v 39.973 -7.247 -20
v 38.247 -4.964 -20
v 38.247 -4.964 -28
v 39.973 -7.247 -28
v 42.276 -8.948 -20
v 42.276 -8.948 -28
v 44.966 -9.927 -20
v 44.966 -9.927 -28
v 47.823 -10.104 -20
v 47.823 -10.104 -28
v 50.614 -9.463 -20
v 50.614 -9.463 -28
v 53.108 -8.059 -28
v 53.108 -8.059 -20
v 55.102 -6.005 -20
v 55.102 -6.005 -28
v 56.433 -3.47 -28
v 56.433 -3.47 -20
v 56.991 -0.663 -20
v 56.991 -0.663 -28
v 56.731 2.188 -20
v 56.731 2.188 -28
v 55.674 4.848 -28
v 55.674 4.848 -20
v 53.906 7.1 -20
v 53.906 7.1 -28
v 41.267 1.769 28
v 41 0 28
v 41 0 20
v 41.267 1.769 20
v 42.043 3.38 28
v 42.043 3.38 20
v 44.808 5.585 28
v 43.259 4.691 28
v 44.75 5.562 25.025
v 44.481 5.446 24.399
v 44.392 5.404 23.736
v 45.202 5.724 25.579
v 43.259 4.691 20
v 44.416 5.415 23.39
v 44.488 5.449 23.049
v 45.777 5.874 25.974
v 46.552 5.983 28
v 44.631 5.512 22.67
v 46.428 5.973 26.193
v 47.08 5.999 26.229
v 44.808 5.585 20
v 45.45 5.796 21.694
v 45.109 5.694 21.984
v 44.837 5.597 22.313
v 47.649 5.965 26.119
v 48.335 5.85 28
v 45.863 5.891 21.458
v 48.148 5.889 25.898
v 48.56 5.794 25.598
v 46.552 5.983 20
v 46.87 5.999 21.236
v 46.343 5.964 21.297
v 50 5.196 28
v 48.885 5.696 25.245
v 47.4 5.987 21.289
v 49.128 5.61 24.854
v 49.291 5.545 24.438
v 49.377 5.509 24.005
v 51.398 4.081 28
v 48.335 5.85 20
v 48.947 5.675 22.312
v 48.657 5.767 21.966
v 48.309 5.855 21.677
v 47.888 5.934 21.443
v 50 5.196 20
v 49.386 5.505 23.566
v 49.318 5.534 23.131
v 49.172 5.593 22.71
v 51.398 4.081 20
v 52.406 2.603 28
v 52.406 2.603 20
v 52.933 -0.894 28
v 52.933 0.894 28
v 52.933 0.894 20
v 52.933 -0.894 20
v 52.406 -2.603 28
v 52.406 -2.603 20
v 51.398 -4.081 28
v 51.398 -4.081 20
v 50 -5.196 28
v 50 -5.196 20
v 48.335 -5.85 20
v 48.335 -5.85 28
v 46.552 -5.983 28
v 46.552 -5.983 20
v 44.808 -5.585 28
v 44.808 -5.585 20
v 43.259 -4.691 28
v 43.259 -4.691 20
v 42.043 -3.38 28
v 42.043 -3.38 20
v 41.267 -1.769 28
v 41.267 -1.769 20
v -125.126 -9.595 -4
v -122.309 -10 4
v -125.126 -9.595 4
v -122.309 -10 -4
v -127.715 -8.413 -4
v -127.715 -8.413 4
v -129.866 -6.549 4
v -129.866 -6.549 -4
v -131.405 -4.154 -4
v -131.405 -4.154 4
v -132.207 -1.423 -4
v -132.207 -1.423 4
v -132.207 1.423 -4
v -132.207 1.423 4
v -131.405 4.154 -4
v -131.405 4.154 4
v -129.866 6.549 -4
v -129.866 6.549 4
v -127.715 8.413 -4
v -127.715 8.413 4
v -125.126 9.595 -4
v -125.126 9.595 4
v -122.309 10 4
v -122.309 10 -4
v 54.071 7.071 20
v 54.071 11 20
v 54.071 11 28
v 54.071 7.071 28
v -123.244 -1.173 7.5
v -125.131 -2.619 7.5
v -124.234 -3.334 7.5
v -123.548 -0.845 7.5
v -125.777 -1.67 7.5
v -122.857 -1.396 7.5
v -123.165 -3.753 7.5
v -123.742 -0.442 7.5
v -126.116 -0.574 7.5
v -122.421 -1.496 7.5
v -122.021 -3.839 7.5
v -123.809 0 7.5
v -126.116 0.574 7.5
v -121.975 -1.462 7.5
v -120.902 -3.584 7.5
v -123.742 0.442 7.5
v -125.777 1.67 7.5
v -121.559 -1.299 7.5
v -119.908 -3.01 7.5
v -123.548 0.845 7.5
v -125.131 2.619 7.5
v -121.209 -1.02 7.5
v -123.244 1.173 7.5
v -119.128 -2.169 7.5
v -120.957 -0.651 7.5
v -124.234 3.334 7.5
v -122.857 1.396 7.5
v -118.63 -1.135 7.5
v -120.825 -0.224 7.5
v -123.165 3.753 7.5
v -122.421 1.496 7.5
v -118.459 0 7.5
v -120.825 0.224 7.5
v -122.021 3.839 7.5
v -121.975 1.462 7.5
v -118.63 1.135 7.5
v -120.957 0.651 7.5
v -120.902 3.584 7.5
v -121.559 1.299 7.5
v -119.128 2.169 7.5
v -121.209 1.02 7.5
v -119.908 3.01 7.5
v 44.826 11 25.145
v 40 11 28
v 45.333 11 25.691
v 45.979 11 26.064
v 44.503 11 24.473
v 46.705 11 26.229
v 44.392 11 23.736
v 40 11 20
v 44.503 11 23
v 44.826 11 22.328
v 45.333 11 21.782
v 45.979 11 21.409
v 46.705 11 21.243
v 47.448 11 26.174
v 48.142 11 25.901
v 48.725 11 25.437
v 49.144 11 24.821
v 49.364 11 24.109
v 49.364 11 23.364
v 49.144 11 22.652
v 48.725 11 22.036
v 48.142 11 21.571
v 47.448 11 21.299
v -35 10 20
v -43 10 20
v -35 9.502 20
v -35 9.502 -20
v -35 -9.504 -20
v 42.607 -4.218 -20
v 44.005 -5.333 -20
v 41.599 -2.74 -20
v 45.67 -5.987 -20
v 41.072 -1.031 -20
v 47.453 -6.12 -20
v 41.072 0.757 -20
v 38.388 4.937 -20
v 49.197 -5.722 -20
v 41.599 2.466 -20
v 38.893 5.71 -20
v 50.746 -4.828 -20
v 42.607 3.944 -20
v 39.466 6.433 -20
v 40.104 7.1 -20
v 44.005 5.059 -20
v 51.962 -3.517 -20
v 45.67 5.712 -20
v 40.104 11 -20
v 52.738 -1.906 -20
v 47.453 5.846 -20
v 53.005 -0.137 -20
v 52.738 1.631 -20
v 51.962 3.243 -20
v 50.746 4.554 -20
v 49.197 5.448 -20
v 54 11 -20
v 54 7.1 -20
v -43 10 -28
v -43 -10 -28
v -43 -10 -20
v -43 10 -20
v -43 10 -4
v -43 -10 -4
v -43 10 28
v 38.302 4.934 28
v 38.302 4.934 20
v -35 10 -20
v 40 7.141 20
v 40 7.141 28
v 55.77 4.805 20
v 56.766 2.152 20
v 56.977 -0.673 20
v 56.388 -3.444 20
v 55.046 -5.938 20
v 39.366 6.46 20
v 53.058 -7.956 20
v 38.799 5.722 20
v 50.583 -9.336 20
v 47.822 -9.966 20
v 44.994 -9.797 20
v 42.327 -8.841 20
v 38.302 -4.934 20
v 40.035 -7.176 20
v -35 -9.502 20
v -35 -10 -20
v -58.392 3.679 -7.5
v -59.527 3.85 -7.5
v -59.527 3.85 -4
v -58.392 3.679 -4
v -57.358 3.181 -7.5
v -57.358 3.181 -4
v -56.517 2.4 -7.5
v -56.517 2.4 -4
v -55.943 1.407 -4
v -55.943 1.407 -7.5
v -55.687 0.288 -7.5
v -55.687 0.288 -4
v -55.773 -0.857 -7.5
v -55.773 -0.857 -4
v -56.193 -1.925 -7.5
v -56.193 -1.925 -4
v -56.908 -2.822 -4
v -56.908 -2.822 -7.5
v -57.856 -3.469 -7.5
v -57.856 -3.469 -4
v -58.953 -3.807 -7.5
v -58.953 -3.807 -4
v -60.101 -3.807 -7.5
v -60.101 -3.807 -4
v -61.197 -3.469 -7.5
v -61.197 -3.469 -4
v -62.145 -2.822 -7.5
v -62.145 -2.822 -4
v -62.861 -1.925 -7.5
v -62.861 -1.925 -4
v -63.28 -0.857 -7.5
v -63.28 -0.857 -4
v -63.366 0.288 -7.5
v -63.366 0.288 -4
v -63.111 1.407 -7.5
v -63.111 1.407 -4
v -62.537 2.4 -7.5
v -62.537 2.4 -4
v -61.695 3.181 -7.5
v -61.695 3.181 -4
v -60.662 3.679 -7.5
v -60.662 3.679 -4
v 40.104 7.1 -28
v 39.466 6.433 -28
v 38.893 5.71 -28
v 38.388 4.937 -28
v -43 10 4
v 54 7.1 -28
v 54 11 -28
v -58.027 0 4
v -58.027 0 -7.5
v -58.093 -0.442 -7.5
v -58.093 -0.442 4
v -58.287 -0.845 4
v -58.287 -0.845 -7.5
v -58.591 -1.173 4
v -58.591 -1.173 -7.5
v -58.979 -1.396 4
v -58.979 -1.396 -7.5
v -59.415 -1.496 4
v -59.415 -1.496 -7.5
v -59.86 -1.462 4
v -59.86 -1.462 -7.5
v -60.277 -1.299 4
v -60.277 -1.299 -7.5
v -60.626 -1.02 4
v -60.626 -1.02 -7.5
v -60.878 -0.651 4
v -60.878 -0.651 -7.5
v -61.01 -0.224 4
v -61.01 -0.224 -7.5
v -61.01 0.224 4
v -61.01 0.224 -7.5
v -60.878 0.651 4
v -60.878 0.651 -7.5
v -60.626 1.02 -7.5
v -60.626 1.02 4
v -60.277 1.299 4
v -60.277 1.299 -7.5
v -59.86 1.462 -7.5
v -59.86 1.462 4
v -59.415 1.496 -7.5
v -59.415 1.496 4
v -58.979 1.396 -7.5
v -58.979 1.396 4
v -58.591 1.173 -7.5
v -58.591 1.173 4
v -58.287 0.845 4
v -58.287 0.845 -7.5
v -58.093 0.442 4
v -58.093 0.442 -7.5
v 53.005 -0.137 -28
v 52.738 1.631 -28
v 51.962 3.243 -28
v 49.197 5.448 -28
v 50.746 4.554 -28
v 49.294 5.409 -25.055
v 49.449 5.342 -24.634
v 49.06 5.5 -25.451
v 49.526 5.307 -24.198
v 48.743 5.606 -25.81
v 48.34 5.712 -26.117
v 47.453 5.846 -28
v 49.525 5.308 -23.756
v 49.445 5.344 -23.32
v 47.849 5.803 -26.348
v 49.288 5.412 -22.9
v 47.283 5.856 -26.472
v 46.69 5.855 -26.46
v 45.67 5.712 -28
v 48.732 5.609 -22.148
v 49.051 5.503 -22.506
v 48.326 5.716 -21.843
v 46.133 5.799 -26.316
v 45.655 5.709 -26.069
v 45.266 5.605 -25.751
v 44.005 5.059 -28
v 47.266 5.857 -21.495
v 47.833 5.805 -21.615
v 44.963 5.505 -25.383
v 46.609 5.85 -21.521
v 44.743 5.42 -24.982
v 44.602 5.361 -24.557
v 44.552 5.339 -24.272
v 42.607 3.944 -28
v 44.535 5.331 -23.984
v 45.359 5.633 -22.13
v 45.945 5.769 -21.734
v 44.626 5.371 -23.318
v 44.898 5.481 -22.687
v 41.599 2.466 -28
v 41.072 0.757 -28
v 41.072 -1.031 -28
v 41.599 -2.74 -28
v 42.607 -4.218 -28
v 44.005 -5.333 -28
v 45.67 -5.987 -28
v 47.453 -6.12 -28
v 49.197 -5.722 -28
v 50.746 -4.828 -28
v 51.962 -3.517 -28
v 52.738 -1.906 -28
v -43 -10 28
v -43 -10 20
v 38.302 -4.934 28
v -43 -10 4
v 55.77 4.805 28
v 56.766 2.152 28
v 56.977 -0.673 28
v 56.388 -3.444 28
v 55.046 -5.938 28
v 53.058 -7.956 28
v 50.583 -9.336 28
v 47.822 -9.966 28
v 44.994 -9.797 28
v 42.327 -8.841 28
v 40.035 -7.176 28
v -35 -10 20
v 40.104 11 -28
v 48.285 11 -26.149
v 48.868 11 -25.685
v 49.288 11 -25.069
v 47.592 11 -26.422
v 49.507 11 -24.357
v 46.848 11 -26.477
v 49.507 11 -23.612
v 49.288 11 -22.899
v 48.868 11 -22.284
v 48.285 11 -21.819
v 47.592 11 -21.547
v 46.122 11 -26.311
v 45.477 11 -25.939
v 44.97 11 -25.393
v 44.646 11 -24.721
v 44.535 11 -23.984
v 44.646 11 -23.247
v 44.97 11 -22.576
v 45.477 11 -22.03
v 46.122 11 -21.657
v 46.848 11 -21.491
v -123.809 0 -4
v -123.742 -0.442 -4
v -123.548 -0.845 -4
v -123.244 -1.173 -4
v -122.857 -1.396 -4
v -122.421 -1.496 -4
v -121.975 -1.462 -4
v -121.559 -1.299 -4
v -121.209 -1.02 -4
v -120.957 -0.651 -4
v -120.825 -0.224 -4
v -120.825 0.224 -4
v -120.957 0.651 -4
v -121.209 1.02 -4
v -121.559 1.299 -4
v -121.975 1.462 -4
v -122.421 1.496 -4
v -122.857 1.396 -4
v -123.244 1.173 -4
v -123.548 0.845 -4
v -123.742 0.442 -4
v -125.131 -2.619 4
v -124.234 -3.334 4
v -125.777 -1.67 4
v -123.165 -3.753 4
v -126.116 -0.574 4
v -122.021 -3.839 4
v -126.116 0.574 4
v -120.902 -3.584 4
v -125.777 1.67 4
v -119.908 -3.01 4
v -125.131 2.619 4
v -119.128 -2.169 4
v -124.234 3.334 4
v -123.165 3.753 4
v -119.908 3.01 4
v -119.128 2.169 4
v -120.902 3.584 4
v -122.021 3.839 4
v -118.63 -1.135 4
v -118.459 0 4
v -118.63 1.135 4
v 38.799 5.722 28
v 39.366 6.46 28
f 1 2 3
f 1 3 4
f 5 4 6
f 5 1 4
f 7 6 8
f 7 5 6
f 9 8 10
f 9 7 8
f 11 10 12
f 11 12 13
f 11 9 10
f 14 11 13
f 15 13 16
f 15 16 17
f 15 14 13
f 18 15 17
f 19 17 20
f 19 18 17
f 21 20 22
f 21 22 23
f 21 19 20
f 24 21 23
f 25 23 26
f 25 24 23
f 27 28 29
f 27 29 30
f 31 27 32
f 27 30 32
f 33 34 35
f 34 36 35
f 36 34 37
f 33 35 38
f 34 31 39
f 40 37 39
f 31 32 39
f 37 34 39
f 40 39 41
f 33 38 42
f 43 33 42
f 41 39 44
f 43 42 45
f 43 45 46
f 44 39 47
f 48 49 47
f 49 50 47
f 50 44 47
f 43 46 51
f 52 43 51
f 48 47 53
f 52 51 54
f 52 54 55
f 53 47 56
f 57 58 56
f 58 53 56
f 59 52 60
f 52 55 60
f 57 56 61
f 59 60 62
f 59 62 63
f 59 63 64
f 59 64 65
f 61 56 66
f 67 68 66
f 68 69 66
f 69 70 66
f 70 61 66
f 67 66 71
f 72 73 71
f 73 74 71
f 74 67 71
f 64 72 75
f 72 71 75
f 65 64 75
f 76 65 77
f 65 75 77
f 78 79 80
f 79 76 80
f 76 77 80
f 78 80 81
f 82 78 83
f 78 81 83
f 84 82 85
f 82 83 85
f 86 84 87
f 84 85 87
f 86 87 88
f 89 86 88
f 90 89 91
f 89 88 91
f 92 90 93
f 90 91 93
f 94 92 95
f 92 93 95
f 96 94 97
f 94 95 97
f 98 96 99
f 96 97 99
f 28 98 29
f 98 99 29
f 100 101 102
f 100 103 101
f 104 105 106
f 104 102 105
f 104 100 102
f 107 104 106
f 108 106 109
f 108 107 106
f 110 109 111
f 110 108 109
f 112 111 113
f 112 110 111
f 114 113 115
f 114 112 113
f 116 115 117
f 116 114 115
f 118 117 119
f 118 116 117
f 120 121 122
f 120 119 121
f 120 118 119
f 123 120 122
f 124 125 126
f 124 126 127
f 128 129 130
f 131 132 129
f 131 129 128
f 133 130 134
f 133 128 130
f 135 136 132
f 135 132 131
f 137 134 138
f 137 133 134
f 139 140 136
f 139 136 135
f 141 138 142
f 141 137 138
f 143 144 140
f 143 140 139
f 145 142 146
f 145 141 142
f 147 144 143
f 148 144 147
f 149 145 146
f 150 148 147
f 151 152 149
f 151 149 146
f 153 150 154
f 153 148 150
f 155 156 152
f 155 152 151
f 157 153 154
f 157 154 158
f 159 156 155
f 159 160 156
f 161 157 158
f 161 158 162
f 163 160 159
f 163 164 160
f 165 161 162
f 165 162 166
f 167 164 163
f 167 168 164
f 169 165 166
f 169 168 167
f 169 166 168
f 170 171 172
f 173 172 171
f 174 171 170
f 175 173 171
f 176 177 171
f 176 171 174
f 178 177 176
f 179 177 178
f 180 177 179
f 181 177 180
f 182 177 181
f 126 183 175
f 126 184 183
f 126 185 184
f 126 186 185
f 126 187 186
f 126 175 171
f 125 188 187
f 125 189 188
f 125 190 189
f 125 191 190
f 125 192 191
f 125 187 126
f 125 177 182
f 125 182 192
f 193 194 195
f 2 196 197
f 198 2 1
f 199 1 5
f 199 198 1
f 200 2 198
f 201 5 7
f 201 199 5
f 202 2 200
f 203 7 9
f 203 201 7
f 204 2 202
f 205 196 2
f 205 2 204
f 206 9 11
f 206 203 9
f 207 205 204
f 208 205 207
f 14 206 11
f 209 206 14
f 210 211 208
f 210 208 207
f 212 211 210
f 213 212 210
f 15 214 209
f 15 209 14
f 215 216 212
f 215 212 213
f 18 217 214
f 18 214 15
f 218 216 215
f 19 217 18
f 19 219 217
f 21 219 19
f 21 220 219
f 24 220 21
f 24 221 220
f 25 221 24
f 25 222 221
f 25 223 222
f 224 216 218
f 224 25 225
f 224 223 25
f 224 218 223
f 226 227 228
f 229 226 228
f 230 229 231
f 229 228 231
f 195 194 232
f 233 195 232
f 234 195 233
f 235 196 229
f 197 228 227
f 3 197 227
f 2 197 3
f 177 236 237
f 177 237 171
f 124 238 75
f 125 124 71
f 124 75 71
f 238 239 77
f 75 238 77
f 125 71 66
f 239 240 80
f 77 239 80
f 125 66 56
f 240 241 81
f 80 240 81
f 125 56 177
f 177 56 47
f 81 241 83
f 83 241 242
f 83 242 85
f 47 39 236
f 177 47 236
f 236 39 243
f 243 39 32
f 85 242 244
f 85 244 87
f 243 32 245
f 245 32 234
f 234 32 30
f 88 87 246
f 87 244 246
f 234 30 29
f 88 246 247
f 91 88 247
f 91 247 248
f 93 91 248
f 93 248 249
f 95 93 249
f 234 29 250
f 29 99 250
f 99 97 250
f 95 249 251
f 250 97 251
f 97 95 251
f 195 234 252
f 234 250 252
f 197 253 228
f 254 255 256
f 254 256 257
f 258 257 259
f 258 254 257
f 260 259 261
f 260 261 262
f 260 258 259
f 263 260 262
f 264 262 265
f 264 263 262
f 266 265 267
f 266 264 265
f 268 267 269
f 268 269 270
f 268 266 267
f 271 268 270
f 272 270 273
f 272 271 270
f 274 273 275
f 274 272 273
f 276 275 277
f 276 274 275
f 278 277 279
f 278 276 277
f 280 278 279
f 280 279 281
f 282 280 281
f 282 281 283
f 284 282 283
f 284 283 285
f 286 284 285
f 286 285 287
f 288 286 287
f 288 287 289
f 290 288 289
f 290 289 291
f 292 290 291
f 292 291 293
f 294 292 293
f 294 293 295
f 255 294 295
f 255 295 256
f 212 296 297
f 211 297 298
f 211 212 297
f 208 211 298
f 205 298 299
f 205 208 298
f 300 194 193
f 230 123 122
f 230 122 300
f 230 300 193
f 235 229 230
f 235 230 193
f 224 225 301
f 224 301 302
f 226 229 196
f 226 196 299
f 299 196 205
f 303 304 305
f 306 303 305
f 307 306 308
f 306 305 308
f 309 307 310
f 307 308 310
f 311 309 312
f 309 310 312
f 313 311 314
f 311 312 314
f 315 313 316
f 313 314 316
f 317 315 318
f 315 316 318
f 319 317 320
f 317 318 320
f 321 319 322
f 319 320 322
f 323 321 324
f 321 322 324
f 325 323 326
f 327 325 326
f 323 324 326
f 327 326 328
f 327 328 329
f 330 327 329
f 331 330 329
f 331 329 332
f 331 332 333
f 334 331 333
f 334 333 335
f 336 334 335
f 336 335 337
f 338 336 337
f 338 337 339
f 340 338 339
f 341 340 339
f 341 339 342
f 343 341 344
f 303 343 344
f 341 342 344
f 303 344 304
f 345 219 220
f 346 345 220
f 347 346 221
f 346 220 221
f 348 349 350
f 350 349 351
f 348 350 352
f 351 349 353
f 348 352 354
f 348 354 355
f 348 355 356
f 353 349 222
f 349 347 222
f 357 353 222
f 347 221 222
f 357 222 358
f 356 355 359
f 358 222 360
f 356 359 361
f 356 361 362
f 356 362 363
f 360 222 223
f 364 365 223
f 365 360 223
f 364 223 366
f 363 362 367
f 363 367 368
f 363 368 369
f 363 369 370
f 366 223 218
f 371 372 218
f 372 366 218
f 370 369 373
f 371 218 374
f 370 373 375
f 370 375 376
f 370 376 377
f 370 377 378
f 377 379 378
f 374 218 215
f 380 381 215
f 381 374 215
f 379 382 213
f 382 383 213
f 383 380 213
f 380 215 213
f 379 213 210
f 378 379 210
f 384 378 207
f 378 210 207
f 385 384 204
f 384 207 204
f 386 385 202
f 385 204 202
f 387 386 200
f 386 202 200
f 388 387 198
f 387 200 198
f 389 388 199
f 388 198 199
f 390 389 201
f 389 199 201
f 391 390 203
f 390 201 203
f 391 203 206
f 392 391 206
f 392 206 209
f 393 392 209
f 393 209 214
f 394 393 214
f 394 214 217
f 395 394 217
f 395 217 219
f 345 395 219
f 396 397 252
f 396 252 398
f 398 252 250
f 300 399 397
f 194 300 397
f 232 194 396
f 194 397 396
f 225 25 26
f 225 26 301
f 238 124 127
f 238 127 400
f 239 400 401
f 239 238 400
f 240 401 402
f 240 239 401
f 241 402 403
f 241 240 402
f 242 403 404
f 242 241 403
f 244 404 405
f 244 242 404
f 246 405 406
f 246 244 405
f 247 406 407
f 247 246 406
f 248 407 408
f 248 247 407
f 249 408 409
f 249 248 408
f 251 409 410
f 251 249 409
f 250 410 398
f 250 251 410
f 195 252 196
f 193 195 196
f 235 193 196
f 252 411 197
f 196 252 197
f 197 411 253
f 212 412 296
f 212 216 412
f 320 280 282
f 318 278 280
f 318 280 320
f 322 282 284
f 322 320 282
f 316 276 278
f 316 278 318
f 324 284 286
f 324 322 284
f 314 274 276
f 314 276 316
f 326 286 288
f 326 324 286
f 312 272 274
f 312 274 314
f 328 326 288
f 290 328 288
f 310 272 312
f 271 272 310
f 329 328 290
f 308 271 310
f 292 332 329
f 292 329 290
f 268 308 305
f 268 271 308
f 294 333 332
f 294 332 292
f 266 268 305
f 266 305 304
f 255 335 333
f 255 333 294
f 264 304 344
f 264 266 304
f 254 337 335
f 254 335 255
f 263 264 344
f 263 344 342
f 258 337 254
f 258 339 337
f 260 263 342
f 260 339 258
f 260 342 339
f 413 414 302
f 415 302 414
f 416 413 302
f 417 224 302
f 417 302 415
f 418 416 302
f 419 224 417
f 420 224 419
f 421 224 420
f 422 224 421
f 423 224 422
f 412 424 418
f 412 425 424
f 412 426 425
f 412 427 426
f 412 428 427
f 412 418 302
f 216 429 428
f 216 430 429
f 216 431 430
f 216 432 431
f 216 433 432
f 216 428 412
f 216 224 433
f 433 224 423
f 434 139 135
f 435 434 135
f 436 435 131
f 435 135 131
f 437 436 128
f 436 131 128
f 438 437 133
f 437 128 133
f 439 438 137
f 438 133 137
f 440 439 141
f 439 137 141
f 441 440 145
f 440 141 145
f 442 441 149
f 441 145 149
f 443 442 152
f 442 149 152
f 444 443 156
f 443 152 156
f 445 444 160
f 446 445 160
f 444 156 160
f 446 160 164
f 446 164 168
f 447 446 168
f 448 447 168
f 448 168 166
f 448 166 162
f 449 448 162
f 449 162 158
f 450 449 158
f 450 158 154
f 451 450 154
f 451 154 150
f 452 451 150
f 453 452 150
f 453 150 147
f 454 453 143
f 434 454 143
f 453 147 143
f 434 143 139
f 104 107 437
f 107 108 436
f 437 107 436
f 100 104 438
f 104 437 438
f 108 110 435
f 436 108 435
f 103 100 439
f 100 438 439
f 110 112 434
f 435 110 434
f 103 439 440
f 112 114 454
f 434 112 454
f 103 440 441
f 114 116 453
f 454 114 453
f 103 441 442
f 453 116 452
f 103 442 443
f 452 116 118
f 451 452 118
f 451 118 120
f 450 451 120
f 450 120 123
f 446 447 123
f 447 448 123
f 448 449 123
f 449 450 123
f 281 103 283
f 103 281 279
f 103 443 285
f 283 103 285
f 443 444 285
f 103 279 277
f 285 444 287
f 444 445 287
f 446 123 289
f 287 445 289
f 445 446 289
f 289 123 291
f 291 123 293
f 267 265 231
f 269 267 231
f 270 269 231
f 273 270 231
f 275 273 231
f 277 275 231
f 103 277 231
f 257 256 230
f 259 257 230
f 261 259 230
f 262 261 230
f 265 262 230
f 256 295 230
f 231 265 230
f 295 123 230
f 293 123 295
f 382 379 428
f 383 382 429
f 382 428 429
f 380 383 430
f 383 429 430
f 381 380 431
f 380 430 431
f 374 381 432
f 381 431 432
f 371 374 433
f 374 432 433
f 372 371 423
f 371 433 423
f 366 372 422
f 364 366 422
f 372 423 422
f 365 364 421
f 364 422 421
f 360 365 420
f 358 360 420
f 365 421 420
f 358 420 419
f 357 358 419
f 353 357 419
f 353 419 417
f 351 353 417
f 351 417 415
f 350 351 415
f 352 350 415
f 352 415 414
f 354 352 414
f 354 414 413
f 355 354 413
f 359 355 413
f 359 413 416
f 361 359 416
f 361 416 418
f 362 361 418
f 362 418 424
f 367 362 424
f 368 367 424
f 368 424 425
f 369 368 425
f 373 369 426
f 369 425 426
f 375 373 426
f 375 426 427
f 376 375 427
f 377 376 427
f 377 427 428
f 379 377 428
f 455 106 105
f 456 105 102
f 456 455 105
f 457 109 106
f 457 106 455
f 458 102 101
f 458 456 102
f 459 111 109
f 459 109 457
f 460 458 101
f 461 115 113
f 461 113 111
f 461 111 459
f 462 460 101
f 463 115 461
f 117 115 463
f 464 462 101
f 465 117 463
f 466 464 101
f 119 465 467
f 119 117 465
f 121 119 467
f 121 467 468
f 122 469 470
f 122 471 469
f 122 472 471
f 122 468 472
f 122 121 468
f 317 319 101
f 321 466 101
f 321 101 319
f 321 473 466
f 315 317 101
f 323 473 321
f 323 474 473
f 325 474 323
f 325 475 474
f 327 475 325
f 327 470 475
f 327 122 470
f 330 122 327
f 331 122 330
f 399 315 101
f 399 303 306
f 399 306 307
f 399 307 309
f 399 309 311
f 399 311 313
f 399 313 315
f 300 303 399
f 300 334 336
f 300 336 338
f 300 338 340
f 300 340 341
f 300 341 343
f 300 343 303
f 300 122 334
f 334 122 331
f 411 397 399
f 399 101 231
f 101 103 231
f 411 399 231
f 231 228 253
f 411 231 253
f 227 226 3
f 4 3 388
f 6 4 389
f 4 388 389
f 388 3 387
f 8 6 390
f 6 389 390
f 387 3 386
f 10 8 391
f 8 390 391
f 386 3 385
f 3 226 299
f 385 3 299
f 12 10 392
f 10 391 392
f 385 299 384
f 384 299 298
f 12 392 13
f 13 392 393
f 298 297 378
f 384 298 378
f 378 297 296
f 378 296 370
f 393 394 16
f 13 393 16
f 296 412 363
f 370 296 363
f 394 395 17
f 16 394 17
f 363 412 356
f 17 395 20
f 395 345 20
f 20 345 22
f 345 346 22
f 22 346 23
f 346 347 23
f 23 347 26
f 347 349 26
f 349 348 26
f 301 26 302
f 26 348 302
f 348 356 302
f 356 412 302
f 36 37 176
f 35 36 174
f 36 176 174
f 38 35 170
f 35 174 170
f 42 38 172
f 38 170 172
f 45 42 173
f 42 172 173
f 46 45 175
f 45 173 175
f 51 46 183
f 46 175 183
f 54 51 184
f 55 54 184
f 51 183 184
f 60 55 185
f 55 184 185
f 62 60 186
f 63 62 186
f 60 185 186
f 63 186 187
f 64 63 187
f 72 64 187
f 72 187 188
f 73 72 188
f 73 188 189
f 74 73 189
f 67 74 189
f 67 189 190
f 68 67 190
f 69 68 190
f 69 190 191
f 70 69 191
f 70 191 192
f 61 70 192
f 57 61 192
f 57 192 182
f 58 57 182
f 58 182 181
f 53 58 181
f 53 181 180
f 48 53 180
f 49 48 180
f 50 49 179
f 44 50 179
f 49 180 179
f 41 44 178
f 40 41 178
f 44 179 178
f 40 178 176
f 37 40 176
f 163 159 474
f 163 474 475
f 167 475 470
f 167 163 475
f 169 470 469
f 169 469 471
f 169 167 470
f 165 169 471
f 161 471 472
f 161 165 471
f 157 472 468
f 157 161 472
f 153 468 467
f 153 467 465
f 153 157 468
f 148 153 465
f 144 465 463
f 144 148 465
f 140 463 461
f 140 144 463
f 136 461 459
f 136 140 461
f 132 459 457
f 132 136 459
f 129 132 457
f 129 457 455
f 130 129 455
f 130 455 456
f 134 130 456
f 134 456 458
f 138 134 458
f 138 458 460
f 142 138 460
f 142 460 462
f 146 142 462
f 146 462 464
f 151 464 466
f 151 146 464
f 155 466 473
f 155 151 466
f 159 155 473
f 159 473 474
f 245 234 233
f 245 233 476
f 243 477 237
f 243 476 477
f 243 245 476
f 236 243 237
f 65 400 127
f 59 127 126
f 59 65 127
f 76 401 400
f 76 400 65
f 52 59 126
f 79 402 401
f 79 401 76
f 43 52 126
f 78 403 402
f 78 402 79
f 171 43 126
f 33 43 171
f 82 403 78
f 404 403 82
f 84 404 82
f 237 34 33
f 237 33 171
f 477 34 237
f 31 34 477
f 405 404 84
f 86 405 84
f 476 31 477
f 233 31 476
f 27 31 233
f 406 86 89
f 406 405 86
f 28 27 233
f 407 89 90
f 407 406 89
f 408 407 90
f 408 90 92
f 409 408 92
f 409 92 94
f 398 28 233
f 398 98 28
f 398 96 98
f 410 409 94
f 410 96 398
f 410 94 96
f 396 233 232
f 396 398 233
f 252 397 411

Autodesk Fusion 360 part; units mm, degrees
sketch "Sketch1" plane through (0, 0, 0) normal (0, 0, 1) x (1, 0, 0)
  circle A0 centre (-60, 0) radius 3.75 construction
  circle A1 centre (-60, 0) radius 10 construction
  line L0 (-120, 10) -> (-40.6913, 10)
  line L1 (-120, -10) -> (-40.6913, -10)
  line L2 (-40.6913, 10) -> (-40.6913, -10)
  arc A2 (-120, 10) -> (-120, -10) centre (-120, 0) ccw
  dimension "d1" = 20
  dimension "d2" = 7.5
  dimension "d3" = 60
  dimension "d4" = 20
extrude "Extrude1" add sketch "Sketch1" along normal blind 8 makes body 1
sketch "Sketch2" plane through (0, 0, 0) normal (0, 1, 0) x (1, 0, 0)
  line L0 (-43, -20) -> (-35, -20)
  line L1 (-35, -20) -> (-35, 20)
  line L2 (-35, 20) -> (-43, 20)
  line L3 (-43, 20) -> (-43, -20)
  dimension "d7" = 8
  dimension "d8" = 40
extrude "Extrude2" add sketch "Sketch2" along normal blind 10 and the other way blind 10 separate body makes body 2
copy_body "Body->Comp1" bodies 1 removing the originals makes body 3 in component "section 1 (l4)"
copy_body "Body->Comp2" bodies 2 removing the originals makes body 4 in component "middle bit"
sketch "Sketch3" plane through (0, 0, 8) normal (0, 0, 1) x (-1, 0, 0)
  line L0 (40.6913, -10) -> (120, -10)
  arc A0 (120, -10) -> (120, 10) centre (120, 0) ccw
  line L1 (120, 10) -> (40.6913, 10)
  line L2 (40.6913, 10) -> (40.6913, -10)
  line L3 (25, -10) -> (25, 10)
  line L4 (25, -10) -> (-56.3022, -4.9345)
  line L5 (25, 10) -> (-56.3022, 4.9345)
  line L6 (-58, -11) -> (-72.0708, -11)
  line L7 (-72.0708, -11) -> (-72.0708, -7.0714)
  line L8 (-58, -7.0714) -> (-58, -11)
  arc A1 (-58, -7.1414) -> (-56.3022, -4.9345) centre (-65, 0) ccw
  arc A2 (-56.3022, 4.9345) -> (-72.0708, -7.0714) centre (-65, 0) ccw
  circle A3 centre (-65, 0) radius 6
  dimension "d17" = 20
  dimension "d18" = 90
  dimension "d19" = 12
extrude "Extrude3" add sketch "Sketch3" along normal blind 8 separate body contours L3 L4 L5 L6 L7 L8 A1 A2 makes body 5
sketch "Sketch5" plane through (0, 0, 0) normal (0, 0, 1) x (1, 0, 0)
  circle A0 centre (65.005, -0.1371) radius 6
  line L0 (-25, -10) -> (-25, 10)
  line L1 (-25, 10) -> (56.3881, 4.9373)
  line L2 (-25, -10) -> (56.247, -4.9638)
  line L3 (71.9058, 7.1002) -> (72, 7.1002)
  line L4 (72, 7.1002) -> (72, 11)
  line L5 (72, 11) -> (58.1042, 11)
  line L6 (58.1042, 11) -> (58.1042, 7.1002)
  arc A1 (56.247, -4.9638) -> (71.9058, 7.1002) centre (65.005, -0.1371) ccw
  arc A2 (58.1042, 7.1002) -> (56.3881, 4.9373) centre (65.005, -0.1371) ccw
  dimension "d24" = 20
  dimension "d25" = 12
extrude "Extrude4" add sketch "Sketch5" against normal blind 8 separate body makes body 6
copy_body "Body->Comp3" bodies 5 removing the originals makes body 7 in component "top arm "
copy_body "Body->Comp4" bodies 6 removing the originals makes body 8 in component "bottom arm"
cylinder "CylinderPrimitive1" add diameter 7.7 height 3.5 placed x (1, 0, 0) y (0, 1, 0) z (0, 0, 1) at (-120, 0, 8) bodies 3 in component "section 1 (l4)"
cylinder "CylinderPrimitive2" add diameter 7.7 height 3.5 placed x (0, 1, 0) y (1, 0, 0) z (0, 0, -1) at (-57.218, 0, 0) bodies 3 in component "section 1 (l4)"
sketch "Sketch9" plane through (-0.218, 11, 0) normal (0, 1, 0) x (-1, 0, 0)
  line L0 (-54.2887, 20) -> (-40.218, 20)
  line L1 (-40.218, 20) -> (-40.218, 28)
  line L2 (-40.218, 28) -> (-54.2887, 28)
  line L3 (-54.2887, 28) -> (-54.2887, 20)
  circle A0 centre (-47.1099, 23.7364) radius 2.5
  circle A1 centre (-47.2533, -23.9842) radius 2.5
  dimension "d44" = 5
  dimension "d45" = 5
extrude "Extrude1'" cut sketch "Sketch9" against normal blind 10 contours A0 | A1 sketch seen with x (1, 0, 0) y (0, 1, 0) z (0, 0, 1) at (18, 0, -12) bodies 7 in component "top arm "
extrude "Extrude1''" cut sketch "Sketch9" against normal blind 10 contours A0 | A1 sketch seen with x (1, 0, 0) y (0, 1, 0) z (0, 0, 1) at (18, 0, 20) bodies 8 in component "bottom arm"
combine "Combine1" operation add target body 3 tool bodies 7 8 4 body 7 seen with x (1, 0, 0) y (0, 1, 0) z (0, 0, 1) at (-15.6913, 0, 16) body 8 seen with x (1, 0, 0) y (0, 1, 0) z (0, 0, 1) at (-15.6913, 0, -16) body 4 seen with x (1, 0, 0) y (0, 1, 0) z (0, 0, 1) at (2.3087, 0, 4) in component "section 1 (l4)"
sketch "Sketch10" plane through (0, 0, 7.5) normal (0, 0, 1) x (-1, 0, 0)
  circle A0 centre (122.3087, 0) radius 3.85
  circle A1 centre (122.3087, 0) radius 1.5
  dimension "d50" = 3
extrude "Extrude1'''" cut sketch "Sketch10" against normal blind 18 contours A1 sketch seen with x (1, 0, 0) y (0, 1, 0) z (0, 0, 1) at (2.3087, 0, 4) bodies 3 in component "section 1 (l4)"
sketch "Sketch11" plane through (0, 0, -7.5) normal (0, 0, -1) x (1, 0, 0)
  circle A0 centre (-59.5266, 0) radius 3.85
  circle A1 centre (-59.5266, 0) radius 1.5
  dimension "d53" = 3
extrude "Extrude2'" cut sketch "Sketch11" against normal blind 14 contours A1 sketch seen with x (1, 0, 0) y (0, 1, 0) z (0, 0, 1) at (2.3087, 0, 4) bodies 3 in component "section 1 (l4)"
component "section 1 (l4)" placed x (1, 0, 0) y (0, 1, 0) z (0, 0, 1) at (-2.3087, 0, -4)
component "middle bit" placed x (1, 0, 0) y (0, 1, 0) z (0, 0, 1) at (0, 0, 0)
component "top arm " placed x (1, 0, 0) y (0, 1, 0) z (0, 0, 1) at (-18, 0, 12)
component "bottom arm" placed x (1, 0, 0) y (0, 1, 0) z (0, 0, 1) at (-18, 0, -20)
